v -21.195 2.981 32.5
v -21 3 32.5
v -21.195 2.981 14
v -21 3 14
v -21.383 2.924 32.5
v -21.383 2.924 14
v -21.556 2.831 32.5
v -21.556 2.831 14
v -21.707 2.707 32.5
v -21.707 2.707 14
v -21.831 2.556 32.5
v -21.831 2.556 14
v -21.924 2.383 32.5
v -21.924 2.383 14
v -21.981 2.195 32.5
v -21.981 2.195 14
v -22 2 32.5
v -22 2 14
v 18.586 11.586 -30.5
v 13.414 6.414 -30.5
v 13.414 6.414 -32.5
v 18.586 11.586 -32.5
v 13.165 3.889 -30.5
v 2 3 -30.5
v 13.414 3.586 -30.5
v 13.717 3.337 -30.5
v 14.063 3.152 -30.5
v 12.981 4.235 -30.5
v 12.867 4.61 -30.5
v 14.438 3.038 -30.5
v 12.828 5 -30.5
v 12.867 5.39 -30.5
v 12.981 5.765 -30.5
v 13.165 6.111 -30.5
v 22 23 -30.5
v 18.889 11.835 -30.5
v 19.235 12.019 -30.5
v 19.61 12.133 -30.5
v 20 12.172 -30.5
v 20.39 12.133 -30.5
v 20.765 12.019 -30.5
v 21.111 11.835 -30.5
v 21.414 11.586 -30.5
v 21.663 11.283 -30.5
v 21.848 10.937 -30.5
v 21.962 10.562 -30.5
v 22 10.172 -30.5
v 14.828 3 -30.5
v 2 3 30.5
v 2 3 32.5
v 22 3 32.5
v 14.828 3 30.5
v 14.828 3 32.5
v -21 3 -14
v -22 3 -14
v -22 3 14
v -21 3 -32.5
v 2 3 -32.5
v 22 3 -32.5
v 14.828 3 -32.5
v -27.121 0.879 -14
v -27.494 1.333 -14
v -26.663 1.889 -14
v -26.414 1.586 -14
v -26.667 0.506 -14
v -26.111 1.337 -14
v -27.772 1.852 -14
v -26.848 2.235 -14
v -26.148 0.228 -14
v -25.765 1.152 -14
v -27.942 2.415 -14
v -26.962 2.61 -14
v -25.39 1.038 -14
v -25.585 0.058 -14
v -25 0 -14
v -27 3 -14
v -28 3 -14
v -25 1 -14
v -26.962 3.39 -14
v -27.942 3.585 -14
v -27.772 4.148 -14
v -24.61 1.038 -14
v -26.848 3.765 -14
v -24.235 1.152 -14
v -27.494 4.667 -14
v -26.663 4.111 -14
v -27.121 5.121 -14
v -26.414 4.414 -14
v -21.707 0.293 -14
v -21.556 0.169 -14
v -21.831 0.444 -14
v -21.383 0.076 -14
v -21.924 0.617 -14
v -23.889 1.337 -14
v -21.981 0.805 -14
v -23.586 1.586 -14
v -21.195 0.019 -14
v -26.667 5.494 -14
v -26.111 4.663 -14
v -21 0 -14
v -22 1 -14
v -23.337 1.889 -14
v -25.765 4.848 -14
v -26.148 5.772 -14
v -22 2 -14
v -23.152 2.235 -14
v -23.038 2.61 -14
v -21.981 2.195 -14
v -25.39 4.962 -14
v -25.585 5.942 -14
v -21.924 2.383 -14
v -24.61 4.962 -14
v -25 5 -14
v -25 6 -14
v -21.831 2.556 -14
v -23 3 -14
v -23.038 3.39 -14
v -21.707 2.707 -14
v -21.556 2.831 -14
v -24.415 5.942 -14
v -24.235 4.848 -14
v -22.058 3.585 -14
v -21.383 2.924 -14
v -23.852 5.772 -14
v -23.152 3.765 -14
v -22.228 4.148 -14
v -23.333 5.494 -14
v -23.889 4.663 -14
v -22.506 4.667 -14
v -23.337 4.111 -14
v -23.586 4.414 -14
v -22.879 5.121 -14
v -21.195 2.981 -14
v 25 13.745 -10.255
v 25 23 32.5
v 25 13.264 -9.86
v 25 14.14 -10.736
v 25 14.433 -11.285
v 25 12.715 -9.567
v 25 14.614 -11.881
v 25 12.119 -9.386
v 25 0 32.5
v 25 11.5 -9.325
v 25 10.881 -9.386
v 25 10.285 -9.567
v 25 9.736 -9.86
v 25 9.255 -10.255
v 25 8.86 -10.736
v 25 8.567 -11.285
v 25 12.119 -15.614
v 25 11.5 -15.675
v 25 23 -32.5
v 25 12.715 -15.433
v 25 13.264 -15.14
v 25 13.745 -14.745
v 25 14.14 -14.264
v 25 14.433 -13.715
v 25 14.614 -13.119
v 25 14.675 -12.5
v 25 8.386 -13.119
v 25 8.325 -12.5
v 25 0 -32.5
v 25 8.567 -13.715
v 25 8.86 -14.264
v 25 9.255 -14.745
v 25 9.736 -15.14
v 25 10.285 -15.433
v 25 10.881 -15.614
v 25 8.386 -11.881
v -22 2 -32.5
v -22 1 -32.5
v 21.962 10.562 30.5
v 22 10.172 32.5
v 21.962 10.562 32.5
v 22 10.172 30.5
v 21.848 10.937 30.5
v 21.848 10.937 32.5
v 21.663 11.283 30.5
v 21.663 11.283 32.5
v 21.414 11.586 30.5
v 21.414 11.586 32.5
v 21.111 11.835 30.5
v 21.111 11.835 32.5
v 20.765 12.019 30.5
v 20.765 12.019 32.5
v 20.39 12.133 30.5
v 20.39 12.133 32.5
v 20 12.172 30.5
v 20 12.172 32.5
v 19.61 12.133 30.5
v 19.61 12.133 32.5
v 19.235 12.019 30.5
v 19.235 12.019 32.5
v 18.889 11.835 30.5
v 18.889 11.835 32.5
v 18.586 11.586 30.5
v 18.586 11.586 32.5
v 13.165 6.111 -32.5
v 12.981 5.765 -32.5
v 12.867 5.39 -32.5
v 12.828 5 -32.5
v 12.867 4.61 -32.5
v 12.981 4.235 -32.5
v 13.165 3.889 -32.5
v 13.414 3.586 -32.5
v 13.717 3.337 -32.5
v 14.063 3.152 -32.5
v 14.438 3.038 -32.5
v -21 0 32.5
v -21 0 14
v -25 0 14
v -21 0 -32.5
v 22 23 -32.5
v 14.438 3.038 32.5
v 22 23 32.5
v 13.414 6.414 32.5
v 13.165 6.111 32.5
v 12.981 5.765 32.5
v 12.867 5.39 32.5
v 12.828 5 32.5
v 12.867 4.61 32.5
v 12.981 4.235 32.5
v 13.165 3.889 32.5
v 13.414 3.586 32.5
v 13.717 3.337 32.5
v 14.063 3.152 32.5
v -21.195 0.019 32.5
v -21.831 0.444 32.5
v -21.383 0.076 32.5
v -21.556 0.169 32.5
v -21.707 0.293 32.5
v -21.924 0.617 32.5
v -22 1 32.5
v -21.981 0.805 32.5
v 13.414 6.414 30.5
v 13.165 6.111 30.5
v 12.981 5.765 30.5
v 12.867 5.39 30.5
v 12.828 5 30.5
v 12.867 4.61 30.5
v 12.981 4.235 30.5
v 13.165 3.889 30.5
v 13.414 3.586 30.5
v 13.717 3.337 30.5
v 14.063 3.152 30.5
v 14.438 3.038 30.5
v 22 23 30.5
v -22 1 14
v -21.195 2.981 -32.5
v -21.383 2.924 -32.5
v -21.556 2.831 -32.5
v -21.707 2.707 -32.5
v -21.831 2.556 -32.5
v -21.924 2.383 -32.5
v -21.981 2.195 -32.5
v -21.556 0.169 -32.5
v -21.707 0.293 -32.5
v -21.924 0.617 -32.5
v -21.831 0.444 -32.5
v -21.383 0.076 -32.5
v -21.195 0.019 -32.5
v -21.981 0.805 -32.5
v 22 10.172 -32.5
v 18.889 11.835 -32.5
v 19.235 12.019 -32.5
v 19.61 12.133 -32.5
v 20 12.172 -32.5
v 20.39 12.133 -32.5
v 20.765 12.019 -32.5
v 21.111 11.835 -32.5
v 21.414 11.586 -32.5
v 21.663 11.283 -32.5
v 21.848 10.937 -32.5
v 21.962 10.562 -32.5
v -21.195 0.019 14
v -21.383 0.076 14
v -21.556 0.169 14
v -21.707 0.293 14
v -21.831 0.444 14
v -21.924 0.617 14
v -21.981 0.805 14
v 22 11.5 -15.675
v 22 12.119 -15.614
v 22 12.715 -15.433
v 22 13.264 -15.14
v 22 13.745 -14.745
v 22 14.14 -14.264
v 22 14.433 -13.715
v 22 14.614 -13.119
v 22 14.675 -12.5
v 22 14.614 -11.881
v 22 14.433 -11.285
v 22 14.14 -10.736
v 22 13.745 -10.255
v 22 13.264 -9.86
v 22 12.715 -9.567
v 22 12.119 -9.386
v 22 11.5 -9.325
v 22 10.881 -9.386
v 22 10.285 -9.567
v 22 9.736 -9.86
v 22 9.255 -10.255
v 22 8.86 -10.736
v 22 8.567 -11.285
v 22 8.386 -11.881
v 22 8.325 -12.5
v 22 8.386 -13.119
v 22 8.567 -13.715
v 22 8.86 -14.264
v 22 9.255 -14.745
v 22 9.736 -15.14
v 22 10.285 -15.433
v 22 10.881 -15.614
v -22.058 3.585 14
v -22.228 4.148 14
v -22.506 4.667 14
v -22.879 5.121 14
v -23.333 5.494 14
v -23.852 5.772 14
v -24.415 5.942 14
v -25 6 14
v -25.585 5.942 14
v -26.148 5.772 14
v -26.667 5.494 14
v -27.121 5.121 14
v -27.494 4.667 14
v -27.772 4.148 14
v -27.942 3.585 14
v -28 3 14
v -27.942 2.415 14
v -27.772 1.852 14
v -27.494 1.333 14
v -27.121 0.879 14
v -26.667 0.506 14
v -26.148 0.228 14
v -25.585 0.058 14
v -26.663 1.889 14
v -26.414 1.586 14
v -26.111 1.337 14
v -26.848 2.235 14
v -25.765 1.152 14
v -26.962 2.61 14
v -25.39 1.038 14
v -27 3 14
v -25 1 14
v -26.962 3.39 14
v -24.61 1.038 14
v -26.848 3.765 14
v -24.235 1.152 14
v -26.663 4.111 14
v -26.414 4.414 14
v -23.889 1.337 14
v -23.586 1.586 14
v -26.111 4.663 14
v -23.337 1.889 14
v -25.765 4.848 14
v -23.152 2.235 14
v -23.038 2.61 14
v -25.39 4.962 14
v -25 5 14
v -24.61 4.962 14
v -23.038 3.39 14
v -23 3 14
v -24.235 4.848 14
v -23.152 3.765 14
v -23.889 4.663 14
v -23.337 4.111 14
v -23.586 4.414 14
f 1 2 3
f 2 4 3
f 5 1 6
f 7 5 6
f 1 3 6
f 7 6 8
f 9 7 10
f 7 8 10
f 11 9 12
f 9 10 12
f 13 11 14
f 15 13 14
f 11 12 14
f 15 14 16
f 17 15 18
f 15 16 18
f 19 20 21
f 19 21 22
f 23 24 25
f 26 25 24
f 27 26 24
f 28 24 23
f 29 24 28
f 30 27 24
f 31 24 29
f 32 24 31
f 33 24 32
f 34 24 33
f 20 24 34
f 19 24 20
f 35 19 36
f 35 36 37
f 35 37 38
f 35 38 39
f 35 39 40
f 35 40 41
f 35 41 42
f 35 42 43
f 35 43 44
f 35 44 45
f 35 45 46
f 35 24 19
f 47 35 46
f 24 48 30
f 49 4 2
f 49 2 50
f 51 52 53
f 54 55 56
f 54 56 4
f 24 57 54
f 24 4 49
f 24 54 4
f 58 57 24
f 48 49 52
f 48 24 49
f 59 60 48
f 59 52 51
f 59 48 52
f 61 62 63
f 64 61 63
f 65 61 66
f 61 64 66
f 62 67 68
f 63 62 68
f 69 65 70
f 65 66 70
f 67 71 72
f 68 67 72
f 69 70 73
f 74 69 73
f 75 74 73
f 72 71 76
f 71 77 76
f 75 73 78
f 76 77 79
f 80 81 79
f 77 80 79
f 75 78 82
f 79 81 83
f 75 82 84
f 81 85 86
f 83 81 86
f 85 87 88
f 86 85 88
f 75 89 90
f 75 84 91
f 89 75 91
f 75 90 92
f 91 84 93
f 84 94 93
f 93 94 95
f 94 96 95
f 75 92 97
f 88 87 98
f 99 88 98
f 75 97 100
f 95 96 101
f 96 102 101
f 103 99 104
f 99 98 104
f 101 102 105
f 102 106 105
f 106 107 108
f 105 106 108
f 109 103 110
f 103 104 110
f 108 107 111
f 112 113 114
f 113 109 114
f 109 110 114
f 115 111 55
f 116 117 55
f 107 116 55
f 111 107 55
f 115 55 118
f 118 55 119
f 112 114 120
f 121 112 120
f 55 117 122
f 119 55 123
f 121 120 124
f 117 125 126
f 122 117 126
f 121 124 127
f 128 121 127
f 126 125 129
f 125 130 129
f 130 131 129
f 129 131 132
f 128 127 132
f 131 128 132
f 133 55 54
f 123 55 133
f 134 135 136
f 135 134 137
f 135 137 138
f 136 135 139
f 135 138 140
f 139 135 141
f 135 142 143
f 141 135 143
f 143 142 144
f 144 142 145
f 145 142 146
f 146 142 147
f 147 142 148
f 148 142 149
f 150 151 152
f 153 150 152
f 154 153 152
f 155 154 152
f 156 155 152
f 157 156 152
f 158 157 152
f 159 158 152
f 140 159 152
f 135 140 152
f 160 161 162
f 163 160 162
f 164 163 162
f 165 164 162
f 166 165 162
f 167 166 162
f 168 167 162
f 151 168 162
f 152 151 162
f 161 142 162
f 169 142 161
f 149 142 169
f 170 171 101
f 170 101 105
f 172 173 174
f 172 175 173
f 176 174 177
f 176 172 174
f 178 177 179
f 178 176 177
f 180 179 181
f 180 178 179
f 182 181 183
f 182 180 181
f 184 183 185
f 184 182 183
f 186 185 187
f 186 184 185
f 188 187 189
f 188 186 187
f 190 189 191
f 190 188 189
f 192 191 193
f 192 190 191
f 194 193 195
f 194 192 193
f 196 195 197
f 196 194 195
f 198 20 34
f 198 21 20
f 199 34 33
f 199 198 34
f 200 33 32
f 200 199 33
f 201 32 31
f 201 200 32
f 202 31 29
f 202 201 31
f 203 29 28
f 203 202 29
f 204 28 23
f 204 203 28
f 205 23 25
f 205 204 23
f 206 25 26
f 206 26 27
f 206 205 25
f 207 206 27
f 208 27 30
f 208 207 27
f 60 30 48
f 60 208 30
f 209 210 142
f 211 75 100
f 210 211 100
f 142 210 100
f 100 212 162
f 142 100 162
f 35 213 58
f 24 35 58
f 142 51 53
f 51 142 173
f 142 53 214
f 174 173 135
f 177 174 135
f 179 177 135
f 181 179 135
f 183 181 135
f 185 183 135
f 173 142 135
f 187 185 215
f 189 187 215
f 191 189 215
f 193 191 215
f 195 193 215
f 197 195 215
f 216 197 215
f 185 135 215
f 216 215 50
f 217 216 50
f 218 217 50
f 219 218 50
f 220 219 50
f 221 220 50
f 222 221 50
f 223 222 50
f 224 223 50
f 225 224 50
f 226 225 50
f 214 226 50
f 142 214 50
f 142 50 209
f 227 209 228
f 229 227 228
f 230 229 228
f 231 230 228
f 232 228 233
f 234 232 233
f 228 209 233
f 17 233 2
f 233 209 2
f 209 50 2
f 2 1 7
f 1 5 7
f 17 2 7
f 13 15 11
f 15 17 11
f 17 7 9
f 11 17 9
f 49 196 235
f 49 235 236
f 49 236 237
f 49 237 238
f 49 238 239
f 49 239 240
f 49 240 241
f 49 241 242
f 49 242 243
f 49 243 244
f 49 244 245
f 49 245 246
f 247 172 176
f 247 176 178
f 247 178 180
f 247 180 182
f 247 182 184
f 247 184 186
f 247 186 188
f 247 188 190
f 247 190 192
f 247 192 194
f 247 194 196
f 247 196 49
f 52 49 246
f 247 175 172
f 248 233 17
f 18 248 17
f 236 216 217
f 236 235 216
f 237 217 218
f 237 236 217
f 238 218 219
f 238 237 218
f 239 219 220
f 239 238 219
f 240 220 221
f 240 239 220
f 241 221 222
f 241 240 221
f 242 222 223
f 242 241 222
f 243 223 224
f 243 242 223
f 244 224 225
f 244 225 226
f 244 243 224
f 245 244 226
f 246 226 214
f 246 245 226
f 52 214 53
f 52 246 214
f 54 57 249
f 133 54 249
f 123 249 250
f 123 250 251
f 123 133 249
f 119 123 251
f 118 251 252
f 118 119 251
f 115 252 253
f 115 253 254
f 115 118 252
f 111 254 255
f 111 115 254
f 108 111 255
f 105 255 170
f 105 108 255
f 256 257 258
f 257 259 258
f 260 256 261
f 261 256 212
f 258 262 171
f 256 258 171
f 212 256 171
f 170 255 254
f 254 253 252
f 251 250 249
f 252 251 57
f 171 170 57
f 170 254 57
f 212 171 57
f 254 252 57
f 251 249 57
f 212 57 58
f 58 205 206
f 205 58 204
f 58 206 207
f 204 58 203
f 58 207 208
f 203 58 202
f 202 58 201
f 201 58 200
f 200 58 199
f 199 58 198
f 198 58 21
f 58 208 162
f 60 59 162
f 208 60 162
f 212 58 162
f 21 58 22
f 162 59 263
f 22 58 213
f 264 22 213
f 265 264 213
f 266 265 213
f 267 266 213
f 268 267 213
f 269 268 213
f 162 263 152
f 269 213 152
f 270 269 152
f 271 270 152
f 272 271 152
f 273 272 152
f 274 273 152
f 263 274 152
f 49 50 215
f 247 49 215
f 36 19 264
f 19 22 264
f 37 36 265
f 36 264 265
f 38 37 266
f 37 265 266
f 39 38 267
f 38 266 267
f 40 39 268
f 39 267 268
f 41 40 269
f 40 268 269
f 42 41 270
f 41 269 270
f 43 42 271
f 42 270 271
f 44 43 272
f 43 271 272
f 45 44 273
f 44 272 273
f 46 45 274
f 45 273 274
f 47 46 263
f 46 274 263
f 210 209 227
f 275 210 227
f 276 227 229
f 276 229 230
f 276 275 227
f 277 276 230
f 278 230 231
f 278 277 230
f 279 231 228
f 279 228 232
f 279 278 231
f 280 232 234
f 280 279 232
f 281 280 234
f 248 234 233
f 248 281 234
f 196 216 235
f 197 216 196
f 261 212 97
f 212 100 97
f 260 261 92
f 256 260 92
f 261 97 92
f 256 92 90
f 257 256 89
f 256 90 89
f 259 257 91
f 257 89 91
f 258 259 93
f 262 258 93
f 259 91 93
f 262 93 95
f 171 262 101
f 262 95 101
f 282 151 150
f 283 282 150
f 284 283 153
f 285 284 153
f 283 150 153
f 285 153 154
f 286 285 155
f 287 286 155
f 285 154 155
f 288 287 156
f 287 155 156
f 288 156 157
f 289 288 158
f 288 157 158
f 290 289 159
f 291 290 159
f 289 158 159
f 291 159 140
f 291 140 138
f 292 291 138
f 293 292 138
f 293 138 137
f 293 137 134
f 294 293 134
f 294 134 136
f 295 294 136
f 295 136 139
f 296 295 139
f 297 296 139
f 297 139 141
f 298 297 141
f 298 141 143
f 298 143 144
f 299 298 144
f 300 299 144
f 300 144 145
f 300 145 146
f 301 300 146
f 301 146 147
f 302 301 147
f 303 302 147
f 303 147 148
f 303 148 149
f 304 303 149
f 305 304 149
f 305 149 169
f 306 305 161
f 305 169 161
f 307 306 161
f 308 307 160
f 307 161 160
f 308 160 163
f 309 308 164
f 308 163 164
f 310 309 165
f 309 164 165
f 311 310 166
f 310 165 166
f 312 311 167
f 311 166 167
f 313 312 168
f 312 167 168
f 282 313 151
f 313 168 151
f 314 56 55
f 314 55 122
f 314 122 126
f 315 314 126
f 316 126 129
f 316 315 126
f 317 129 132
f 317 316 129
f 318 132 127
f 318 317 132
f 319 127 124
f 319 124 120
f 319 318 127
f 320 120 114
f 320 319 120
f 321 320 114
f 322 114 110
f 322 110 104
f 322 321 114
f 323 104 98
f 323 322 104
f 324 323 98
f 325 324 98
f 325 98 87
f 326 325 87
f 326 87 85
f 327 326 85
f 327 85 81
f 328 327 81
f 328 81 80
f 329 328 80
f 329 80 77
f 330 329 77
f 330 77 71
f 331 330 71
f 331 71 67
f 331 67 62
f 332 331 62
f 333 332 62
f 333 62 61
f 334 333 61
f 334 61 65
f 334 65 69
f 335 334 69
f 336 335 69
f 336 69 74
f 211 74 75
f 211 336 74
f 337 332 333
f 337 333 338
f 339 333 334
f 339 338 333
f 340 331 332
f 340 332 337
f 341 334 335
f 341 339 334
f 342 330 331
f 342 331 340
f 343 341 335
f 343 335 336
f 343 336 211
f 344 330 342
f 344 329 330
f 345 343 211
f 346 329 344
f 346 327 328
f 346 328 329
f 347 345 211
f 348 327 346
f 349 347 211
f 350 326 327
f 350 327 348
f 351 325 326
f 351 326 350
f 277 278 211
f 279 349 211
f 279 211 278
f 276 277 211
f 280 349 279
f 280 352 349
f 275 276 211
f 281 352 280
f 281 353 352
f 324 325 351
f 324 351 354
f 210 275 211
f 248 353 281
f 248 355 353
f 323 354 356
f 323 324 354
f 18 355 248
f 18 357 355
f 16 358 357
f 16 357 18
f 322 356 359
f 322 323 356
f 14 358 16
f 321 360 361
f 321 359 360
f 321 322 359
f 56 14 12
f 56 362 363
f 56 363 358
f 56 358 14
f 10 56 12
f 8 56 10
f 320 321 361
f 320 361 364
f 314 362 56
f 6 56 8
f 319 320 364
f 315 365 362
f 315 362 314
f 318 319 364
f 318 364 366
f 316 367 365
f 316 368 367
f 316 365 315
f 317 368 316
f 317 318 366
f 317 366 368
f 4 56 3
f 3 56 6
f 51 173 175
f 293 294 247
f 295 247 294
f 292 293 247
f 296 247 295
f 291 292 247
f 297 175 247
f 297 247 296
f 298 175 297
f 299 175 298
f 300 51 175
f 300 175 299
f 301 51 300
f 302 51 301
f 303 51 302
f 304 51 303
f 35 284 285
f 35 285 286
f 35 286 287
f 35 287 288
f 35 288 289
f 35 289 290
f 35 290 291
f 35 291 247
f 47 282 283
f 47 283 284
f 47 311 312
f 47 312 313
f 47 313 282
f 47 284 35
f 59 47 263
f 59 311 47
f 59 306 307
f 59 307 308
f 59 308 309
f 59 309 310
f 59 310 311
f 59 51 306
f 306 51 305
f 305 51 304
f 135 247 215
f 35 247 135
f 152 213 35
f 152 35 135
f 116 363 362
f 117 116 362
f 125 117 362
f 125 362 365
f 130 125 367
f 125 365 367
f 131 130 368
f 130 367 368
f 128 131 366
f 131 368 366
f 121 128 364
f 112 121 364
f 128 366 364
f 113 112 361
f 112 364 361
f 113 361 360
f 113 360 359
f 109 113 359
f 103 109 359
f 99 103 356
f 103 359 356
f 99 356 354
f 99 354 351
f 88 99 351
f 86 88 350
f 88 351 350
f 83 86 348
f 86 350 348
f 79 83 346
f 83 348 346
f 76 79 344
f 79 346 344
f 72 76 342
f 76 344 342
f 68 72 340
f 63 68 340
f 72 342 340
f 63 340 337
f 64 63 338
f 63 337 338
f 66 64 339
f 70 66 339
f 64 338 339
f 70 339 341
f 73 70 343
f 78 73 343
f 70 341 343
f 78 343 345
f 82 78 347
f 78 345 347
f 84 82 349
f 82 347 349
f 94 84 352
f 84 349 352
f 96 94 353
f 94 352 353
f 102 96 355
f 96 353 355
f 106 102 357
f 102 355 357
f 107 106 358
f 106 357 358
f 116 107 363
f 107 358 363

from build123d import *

# Parameters (mm, degrees)
SKETCH1_W           = 50
SKETCH1_H           = 65
BOSS_EXTRUDE1_DEPTH = 3
SKETCH2_W           = 3
SKETCH2_H           = 3
CUT_EXTRUDE1_DEPTH  = 18.5
SKETCH3_W           = 3
SKETCH3_H           = 3
CUT_EXTRUDE2_DEPTH  = 18.5
SKETCH4_R           = 3
BOSS_EXTRUDE2_DEPTH = 28
SKETCH5_R           = 2
CUT_EXTRUDE3_DEPTH  = 28
FILLET1_R           = 1
SKETCH6_W           = 3
SKETCH6_H           = 65
BOSS_EXTRUDE3_DEPTH = 20
BOSS_EXTRUDE4_DEPTH = 2
BOSS_EXTRUDE5_DEPTH = 2
CUT_EXTRUDE4_DEPTH  = 82
FILLET2_R           = 2
SKETCH10_R          = 3.175
CUT_EXTRUDE5_DEPTH  = 82


with BuildPart() as part:
    # Sketch1 → Boss-Extrude1 (new body)
    with BuildSketch(Plane(origin=(0, 0, 0), x_dir=(1, 0, 0), z_dir=(0, 1, 0))):
        Rectangle(SKETCH1_W, SKETCH1_H)
    extrude(amount=BOSS_EXTRUDE1_DEPTH)

    # Sketch2 → Cut-Extrude1 (cut)
    with BuildSketch(Plane.XY.offset(32.5)):
        with Locations((-23.5, 1.5)):
            Rectangle(SKETCH2_W, SKETCH2_H)
    extrude(amount=-CUT_EXTRUDE1_DEPTH, mode=Mode.SUBTRACT)

    # Sketch3 → Cut-Extrude2 (cut)
    with BuildSketch(Plane(origin=(0, 0, -32.5), x_dir=(-1, 0, 0), z_dir=(0, 0, -1))):
        with Locations((23.5, 1.5)):
            Rectangle(SKETCH3_W, SKETCH3_H)
    extrude(amount=-CUT_EXTRUDE2_DEPTH, mode=Mode.SUBTRACT)

    # Sketch4 → Boss-Extrude2 (add)
    with BuildSketch(Plane.XY.offset(14)):
        with Locations((-25, 3)):
            Circle(SKETCH4_R)
    extrude(amount=-BOSS_EXTRUDE2_DEPTH)

    # Sketch5 → Cut-Extrude3 (cut)
    with BuildSketch(Plane.XY.offset(14)):
        with Locations((-25, 3)):
            Circle(SKETCH5_R)
    extrude(amount=-CUT_EXTRUDE3_DEPTH, mode=Mode.SUBTRACT)

    # Fillet1
    fillet1_edges = [part.edges().sort_by_distance(p)[0] for p in [
        (-22, 3, 23.25),
        (-22, 0, 23.25),
        (-22, 0, -23.25),
        (-22, 3, -23.25),
    ]]
    fillet(fillet1_edges, radius=FILLET1_R)

    # Sketch6 → Boss-Extrude3 (add)
    with BuildSketch(Plane(origin=(0, 3, 0), x_dir=(1, 0, 0), z_dir=(0, 1, 0))):
        with Locations((23.5, 0)):
            Rectangle(SKETCH6_W, SKETCH6_H)
    extrude(amount=BOSS_EXTRUDE3_DEPTH)

    # Sketch7 → Boss-Extrude4 (add)
    with BuildSketch(Plane.XY.offset(32.5)):
        Polygon((22, 23), (22, 3), (2, 3), align=None)
    extrude(amount=-BOSS_EXTRUDE4_DEPTH)

    # Sketch8 → Boss-Extrude5 (add)
    with BuildSketch(Plane(origin=(0, 0, -32.5), x_dir=(-1, 0, 0), z_dir=(0, 0, -1))):
        Polygon((-22, 23), (-2, 3), (-22, 3), align=None)
    extrude(amount=-BOSS_EXTRUDE5_DEPTH)

    # Sketch9 → Cut-Extrude4 (cut)
    with BuildSketch(Plane.XY.offset(32.5)):
        Polygon((22, 15), (22, 3), (10, 3), align=None)
    extrude(amount=-CUT_EXTRUDE4_DEPTH, mode=Mode.SUBTRACT)

    # Fillet2
    fillet2_edges = [part.edges().sort_by_distance(p)[0] for p in [
        (10, 3, -31.5),
        (22, 15, -31.5),
        (10, 3, 31.5),
        (22, 15, 31.5),
    ]]
    fillet(fillet2_edges, radius=FILLET2_R)

    # Sketch10 → Cut-Extrude5 (cut)
    with BuildSketch(Plane(origin=(25, 0, 0), x_dir=(0, 0, -1), z_dir=(1, 0, 0))):
        with Locations((12.5, 11.5)):
            Circle(SKETCH10_R)
    extrude(amount=-CUT_EXTRUDE5_DEPTH, mode=Mode.SUBTRACT)


solid = part.part
